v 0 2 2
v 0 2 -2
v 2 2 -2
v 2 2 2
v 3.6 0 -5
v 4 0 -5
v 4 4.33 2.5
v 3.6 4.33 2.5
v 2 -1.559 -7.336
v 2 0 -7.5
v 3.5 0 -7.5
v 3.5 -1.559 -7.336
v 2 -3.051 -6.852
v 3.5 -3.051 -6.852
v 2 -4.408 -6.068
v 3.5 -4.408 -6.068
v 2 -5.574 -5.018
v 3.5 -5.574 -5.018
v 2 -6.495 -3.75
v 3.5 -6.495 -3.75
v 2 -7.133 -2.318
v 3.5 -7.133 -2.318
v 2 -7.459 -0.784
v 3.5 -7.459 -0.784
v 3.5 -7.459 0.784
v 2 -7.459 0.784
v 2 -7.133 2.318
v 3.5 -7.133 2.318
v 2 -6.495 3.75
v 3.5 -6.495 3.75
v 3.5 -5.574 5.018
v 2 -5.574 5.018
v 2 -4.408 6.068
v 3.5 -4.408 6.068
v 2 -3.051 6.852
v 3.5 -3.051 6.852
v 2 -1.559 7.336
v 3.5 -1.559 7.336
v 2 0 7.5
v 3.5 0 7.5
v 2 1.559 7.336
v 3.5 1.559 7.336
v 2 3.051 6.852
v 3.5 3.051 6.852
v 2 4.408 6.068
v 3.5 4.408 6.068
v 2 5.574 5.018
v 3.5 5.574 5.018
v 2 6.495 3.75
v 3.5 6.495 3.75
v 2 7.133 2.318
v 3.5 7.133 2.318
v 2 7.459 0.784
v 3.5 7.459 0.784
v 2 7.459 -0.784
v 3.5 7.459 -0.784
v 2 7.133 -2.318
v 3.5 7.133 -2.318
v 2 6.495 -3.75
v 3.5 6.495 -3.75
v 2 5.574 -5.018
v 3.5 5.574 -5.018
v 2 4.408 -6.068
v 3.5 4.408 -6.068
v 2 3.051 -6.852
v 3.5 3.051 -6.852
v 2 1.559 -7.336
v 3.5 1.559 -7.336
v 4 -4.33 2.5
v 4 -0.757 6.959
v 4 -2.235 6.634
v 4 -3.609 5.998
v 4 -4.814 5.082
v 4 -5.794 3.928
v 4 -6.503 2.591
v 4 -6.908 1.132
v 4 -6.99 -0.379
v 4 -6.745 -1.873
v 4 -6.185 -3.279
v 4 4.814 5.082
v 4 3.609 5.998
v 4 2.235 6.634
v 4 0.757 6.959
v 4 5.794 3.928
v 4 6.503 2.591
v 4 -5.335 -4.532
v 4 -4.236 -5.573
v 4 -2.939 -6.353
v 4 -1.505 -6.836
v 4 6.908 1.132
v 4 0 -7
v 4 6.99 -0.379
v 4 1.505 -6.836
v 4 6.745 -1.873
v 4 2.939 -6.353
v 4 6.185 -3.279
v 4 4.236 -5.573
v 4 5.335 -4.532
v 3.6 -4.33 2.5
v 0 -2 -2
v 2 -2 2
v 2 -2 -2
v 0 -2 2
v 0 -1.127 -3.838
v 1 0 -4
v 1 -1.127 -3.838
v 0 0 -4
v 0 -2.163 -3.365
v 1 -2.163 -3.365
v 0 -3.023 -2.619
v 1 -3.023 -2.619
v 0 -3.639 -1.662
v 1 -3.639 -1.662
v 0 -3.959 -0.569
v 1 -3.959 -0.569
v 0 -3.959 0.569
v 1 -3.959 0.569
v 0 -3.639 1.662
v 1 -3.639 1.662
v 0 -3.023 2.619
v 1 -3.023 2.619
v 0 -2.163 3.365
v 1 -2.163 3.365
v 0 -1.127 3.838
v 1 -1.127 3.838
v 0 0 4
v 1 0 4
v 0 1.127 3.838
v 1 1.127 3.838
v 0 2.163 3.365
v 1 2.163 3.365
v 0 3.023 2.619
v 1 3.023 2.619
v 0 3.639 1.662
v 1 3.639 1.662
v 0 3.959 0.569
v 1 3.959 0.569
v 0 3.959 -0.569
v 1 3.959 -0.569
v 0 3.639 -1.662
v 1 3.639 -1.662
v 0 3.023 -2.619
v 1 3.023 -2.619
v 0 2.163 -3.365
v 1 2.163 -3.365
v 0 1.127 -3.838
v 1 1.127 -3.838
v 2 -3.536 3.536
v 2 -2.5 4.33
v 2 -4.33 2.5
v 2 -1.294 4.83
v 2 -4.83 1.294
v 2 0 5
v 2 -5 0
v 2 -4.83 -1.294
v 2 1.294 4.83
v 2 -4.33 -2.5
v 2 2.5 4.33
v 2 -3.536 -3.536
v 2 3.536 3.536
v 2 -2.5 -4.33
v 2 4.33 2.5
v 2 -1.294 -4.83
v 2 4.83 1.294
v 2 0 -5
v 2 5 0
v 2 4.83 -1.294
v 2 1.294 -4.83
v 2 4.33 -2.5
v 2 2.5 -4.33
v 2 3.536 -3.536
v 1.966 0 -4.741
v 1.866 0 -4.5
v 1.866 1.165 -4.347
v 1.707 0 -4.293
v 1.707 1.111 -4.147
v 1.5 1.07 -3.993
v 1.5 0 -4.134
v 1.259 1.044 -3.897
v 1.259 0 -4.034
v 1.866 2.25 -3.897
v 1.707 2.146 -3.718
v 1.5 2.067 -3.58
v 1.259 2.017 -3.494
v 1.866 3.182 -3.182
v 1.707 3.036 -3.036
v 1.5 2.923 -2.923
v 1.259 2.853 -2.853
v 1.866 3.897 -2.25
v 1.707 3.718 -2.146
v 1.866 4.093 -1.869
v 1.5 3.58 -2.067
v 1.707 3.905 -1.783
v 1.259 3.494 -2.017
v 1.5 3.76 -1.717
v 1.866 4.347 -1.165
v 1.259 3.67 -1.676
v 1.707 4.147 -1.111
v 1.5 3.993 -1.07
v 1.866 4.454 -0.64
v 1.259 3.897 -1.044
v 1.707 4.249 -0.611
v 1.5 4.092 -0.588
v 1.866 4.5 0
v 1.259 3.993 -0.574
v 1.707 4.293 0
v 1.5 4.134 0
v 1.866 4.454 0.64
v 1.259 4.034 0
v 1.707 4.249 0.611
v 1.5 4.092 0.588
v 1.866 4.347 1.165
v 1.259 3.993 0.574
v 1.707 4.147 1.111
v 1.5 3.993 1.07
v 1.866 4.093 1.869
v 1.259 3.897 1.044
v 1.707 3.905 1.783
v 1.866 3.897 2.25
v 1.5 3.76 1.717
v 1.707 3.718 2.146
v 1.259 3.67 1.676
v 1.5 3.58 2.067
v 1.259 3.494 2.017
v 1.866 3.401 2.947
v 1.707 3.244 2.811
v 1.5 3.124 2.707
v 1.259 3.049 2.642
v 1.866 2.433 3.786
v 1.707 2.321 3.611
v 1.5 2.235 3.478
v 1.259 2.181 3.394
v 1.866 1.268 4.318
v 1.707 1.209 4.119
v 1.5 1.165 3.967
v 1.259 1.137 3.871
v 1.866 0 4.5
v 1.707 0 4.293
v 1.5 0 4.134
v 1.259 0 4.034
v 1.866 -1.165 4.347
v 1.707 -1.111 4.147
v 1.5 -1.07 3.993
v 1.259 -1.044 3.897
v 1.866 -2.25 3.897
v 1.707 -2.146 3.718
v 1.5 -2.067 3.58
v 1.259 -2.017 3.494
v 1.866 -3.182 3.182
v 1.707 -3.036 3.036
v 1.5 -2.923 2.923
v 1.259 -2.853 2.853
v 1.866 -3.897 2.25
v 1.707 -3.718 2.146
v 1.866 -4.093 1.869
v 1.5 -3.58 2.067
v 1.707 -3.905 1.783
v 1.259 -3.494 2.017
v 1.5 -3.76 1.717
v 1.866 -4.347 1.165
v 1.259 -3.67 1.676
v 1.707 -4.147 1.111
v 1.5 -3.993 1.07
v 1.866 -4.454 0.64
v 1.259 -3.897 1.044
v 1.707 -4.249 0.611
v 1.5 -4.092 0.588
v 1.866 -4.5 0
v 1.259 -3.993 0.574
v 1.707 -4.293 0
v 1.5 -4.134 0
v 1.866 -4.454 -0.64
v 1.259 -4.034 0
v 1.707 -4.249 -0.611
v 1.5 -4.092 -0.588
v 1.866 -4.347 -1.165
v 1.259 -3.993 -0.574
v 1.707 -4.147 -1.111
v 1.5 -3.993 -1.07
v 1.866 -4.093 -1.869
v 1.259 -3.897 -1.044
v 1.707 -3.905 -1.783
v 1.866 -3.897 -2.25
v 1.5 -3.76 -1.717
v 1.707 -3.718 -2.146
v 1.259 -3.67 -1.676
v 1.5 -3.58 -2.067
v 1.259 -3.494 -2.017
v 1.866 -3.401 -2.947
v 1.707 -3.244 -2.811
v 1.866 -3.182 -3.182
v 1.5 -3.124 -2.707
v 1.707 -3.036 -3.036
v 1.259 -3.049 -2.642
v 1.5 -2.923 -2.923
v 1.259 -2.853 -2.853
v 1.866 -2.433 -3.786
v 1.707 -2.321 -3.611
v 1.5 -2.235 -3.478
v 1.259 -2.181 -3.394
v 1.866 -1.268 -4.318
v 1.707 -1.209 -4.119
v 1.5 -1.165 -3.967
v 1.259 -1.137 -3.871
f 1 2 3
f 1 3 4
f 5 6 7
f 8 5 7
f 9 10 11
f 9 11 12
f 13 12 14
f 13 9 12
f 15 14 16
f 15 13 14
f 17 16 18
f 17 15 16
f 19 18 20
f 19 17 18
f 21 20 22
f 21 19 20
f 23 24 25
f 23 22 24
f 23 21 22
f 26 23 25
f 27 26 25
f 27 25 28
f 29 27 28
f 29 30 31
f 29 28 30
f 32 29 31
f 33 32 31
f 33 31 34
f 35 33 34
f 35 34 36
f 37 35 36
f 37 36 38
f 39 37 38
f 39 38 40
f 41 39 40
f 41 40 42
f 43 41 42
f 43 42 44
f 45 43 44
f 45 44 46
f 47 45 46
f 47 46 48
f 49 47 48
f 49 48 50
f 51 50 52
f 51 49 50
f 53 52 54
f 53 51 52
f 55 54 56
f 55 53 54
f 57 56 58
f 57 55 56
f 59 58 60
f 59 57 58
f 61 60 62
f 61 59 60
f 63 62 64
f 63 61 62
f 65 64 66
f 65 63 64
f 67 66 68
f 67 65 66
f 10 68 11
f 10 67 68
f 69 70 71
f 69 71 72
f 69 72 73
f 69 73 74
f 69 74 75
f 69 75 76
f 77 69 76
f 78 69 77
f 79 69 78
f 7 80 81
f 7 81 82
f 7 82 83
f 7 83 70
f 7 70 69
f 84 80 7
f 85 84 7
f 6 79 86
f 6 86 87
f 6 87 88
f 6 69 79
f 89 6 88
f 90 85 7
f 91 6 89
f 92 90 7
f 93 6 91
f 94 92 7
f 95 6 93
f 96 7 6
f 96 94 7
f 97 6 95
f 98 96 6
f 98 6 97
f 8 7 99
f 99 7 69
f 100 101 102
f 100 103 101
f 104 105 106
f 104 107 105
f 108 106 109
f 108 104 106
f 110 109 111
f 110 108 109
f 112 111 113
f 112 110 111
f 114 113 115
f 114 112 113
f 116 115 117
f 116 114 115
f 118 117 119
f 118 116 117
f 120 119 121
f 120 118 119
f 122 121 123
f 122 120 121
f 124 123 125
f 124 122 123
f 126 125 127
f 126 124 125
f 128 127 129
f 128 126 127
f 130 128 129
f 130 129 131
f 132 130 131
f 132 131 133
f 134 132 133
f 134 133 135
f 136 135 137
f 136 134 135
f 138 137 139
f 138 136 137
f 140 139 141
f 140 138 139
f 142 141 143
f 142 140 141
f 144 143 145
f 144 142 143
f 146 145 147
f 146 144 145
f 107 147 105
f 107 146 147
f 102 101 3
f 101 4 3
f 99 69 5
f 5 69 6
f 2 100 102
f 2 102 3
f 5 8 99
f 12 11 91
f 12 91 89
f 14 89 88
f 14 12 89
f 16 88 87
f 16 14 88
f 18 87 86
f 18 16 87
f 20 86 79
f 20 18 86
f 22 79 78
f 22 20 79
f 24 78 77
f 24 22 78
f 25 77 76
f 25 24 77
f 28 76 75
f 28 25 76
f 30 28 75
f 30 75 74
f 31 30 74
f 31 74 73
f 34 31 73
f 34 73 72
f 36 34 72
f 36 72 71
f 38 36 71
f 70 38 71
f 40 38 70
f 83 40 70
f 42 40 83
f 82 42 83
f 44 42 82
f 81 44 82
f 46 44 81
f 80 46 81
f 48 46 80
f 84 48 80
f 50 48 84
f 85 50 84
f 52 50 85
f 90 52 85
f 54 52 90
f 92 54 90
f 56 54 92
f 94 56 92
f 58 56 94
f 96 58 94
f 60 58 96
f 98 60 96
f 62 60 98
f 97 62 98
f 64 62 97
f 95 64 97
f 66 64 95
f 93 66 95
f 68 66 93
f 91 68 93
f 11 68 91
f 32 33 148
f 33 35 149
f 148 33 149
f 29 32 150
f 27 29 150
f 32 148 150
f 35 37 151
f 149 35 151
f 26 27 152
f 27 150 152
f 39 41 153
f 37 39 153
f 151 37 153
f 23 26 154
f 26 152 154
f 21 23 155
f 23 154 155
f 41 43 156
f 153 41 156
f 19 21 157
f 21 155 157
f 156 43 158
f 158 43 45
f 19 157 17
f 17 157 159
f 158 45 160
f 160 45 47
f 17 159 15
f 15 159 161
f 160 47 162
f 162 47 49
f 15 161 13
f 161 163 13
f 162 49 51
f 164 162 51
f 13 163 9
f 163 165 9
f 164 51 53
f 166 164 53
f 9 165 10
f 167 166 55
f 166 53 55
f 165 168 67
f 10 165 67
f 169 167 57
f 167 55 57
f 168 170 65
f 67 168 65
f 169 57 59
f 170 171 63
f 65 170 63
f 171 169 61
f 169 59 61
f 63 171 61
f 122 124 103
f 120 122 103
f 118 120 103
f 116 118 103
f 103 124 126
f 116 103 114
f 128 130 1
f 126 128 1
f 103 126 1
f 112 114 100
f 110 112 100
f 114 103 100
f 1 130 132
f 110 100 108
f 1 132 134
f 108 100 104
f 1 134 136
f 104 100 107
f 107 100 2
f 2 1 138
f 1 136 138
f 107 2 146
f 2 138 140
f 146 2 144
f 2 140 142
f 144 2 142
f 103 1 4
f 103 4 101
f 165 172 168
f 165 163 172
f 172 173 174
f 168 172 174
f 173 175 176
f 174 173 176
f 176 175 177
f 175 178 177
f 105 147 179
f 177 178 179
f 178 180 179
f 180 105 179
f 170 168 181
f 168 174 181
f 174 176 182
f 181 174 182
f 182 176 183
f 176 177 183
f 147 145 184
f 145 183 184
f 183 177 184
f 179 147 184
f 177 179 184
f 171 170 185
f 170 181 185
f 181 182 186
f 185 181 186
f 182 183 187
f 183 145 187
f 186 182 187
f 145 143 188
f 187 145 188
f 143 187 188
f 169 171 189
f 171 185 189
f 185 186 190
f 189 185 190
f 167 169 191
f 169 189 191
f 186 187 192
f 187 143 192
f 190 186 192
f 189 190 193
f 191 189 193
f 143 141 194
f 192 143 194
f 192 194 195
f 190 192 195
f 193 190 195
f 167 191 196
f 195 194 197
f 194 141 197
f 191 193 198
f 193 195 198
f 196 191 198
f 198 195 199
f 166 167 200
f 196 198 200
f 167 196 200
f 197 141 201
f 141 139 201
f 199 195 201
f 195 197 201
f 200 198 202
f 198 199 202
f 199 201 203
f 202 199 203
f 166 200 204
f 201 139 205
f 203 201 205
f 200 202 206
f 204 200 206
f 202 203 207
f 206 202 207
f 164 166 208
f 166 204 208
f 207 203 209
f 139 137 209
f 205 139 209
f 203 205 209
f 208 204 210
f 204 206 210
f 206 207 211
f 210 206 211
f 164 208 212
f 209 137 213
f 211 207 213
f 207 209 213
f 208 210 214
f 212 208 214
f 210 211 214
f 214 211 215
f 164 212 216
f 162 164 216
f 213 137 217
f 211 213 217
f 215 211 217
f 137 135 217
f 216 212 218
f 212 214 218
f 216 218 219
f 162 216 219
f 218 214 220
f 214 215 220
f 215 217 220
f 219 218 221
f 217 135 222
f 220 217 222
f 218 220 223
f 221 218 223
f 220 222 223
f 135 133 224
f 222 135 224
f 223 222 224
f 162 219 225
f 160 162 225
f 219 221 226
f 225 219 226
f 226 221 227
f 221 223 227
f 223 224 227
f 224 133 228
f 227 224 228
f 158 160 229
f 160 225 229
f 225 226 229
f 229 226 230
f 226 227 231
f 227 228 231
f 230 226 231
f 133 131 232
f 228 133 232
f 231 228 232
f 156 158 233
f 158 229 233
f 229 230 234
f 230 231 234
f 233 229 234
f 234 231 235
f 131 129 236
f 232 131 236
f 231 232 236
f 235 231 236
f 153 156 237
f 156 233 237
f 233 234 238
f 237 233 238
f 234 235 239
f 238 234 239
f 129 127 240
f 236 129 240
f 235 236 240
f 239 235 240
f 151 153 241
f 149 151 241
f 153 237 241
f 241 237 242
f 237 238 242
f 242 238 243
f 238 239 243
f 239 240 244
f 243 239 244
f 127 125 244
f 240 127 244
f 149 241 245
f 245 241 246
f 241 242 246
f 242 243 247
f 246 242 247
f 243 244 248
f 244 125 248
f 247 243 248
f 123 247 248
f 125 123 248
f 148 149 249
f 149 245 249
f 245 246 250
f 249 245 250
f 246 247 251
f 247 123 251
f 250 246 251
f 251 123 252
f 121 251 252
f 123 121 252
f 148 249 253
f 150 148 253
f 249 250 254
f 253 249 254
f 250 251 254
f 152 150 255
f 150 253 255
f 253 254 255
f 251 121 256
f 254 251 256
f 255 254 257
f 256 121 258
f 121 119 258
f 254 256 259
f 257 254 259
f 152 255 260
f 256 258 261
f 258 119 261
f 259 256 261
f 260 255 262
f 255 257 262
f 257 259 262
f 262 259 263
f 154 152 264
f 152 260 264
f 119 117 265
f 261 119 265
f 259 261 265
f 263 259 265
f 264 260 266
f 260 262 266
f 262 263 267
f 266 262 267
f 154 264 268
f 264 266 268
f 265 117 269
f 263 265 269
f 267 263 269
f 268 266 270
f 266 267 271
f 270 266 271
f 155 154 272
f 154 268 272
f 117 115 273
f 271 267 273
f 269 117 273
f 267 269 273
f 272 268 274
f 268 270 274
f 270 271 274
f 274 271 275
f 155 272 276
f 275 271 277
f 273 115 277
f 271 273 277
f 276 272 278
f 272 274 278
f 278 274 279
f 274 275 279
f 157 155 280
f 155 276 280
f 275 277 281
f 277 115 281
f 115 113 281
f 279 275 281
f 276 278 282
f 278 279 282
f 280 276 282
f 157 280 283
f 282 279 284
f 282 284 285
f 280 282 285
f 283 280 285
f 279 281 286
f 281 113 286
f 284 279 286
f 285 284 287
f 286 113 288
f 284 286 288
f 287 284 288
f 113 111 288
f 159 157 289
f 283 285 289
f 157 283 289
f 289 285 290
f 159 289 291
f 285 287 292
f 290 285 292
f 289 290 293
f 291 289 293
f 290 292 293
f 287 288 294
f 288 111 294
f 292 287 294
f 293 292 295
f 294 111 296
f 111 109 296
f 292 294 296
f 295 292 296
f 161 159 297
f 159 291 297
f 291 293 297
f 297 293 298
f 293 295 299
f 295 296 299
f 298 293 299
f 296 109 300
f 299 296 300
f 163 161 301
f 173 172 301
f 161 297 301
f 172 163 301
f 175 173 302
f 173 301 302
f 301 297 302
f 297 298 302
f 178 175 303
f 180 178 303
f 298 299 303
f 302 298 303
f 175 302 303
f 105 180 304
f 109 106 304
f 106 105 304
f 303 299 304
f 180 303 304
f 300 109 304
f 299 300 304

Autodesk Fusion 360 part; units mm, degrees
sketch "Sketch1" plane through (0, 0, 0) normal (1, 0, 0) x (0, 0, -1)
  circle A0 centre (0, 0) radius 4
  line L0 (2, 2) -> (-2, 2)
  line L1 (-2, 2) -> (-2, -2)
  line L2 (-2, -2) -> (2, -2)
  line L3 (2, -2) -> (2, 2)
  line L4 (2, 2) -> (-2, -2) construction
  line L5 (-2, 2) -> (2, -2) construction
  dimension "d1" = 8
  dimension "d2" = 4
  dimension "d3" = 4
extrude "Extrude1" add sketch "Sketch1" along normal blind 2
sketch "Sketch2" plane through (2, 0, 0) normal (1, 0, 0) x (0, 0, -1)
  line L0 (2, 2) -> (2, -2)
  line L1 (2, -2) -> (-2, -2)
  line L2 (-2, -2) -> (-2, 2)
  line L3 (-2, 2) -> (2, 2)
  circle A0 centre (0, 0) radius 4
  circle A1 centre (0, 0) radius 7.5
  dimension "d6" = 15
extrude "Extrude2" add sketch "Sketch2" along normal blind 2 contours L0 L1 L2 L3 | A0 | A1
fillet "Fillet1" radius 1 1 edges at (2, -1.4465, 3.7293)
chamfer "Chamfer1" distance 0.5 angle 45 1 edges at (4, -2.7121, 6.9925)
sketch "Sketch3" plane through (4, 0, 0) normal (1, 0, 0) x (0, 0, -1)
  circle A0 centre (0, 0) radius 7
  line L0 (-2.5, 4.3301) -> (-2.5, -4.3301)
  line L1 (-2.5, -4.3301) -> (5, 0)
  line L2 (5, 0) -> (-2.5, 4.3301)
  dimension "d12" = 2.5
extrude "Extrude3" cut sketch "Sketch3" against normal blind 0.4 contours L0 L1 L2
